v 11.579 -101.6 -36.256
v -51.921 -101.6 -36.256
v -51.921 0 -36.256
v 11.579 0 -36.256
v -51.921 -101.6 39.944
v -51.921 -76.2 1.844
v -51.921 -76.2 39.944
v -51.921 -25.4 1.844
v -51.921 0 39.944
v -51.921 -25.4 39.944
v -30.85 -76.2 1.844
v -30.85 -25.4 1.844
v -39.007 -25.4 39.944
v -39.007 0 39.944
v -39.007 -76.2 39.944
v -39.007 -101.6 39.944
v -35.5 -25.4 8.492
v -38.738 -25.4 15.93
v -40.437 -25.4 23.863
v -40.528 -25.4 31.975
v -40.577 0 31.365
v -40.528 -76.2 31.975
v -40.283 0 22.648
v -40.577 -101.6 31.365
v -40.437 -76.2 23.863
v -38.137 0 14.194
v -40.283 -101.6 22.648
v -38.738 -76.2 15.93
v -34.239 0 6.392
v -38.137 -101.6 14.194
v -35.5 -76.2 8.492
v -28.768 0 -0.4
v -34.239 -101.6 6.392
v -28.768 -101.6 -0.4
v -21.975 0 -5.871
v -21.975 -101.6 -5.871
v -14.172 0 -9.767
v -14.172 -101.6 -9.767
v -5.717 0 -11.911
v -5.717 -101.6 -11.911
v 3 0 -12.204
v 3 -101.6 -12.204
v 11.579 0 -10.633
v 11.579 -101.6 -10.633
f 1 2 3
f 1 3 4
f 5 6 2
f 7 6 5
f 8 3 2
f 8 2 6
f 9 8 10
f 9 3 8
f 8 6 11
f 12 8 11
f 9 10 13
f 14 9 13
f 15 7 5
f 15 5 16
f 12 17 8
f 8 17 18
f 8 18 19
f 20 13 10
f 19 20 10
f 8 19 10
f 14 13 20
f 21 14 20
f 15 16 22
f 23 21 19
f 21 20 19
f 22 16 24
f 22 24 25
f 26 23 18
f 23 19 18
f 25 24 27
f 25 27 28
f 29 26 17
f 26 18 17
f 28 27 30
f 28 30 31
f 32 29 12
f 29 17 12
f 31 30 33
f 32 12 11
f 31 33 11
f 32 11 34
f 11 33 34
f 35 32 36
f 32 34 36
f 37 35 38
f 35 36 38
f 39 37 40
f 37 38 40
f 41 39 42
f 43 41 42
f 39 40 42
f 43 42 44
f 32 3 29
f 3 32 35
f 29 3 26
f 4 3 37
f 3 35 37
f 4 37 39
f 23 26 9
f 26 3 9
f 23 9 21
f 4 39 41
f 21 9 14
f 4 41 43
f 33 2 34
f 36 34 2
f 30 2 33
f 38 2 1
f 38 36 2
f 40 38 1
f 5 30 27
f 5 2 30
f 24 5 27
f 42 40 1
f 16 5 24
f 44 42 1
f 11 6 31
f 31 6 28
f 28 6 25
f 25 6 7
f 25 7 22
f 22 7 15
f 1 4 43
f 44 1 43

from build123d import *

# Parameters (mm, degrees)
F0_W     = 63.5
F0_H     = 76.2
F1_DEPTH = 101.6
F3_DEPTH = 144.018
F4_W     = 12.4857110355
F4_H     = 50.8
F4_W_2   = 12.9142889645
F5_DEPTH = 38.1


with BuildPart() as f1:
    # F0 (on Front) → F1 (new body)
    with BuildSketch(Plane.XZ):
        with Locations((-20.1713825464, 1.844201237)):
            Rectangle(F0_W, F0_H)
    extrude(amount=F1_DEPTH)

    # F2 (on face) → F3 (cut)
    with BuildSketch(Plane.XZ.offset(101.6)):
        with BuildLine():
            ThreePointArc((11.5786174536, -10.632746352), (32.6080102155, 4.0376145015), (40.6873602154, 28.372341767))
            ThreePointArc((40.6873602154, 28.372341767), (5.8466064421, 68.6374442058), (-39.0070935819, 39.944201237))
            Line((-39.0070935819, 39.944201237), (11.5786174536, 39.944201237))
            Line((11.5786174536, 39.944201237), (11.5786174536, -10.632746352))
        make_face()
        with BuildLine():
            Line((11.5786174536, 39.944201237), (-39.0070935819, 39.944201237))
            ThreePointArc((-39.0070935819, 39.944201237), (-28.7678159153, -0.4004587357), (11.5786174536, -10.632746352))
            Line((11.5786174536, -10.632746352), (11.5786174536, 39.944201237))
        make_face()
    extrude(amount=-F3_DEPTH, mode=Mode.SUBTRACT)

    # F4 (on face) → F5 (cut)
    with BuildSketch(Plane.XY.offset(39.944201237)):
        with Locations((-32.7642380642, -50.8)):
            Rectangle(F4_W, F4_H)
        with Locations((-45.4642380642, -50.8)):
            Rectangle(F4_W_2, F4_H)
    extrude(amount=-F5_DEPTH, mode=Mode.SUBTRACT)


solid = f1.part
